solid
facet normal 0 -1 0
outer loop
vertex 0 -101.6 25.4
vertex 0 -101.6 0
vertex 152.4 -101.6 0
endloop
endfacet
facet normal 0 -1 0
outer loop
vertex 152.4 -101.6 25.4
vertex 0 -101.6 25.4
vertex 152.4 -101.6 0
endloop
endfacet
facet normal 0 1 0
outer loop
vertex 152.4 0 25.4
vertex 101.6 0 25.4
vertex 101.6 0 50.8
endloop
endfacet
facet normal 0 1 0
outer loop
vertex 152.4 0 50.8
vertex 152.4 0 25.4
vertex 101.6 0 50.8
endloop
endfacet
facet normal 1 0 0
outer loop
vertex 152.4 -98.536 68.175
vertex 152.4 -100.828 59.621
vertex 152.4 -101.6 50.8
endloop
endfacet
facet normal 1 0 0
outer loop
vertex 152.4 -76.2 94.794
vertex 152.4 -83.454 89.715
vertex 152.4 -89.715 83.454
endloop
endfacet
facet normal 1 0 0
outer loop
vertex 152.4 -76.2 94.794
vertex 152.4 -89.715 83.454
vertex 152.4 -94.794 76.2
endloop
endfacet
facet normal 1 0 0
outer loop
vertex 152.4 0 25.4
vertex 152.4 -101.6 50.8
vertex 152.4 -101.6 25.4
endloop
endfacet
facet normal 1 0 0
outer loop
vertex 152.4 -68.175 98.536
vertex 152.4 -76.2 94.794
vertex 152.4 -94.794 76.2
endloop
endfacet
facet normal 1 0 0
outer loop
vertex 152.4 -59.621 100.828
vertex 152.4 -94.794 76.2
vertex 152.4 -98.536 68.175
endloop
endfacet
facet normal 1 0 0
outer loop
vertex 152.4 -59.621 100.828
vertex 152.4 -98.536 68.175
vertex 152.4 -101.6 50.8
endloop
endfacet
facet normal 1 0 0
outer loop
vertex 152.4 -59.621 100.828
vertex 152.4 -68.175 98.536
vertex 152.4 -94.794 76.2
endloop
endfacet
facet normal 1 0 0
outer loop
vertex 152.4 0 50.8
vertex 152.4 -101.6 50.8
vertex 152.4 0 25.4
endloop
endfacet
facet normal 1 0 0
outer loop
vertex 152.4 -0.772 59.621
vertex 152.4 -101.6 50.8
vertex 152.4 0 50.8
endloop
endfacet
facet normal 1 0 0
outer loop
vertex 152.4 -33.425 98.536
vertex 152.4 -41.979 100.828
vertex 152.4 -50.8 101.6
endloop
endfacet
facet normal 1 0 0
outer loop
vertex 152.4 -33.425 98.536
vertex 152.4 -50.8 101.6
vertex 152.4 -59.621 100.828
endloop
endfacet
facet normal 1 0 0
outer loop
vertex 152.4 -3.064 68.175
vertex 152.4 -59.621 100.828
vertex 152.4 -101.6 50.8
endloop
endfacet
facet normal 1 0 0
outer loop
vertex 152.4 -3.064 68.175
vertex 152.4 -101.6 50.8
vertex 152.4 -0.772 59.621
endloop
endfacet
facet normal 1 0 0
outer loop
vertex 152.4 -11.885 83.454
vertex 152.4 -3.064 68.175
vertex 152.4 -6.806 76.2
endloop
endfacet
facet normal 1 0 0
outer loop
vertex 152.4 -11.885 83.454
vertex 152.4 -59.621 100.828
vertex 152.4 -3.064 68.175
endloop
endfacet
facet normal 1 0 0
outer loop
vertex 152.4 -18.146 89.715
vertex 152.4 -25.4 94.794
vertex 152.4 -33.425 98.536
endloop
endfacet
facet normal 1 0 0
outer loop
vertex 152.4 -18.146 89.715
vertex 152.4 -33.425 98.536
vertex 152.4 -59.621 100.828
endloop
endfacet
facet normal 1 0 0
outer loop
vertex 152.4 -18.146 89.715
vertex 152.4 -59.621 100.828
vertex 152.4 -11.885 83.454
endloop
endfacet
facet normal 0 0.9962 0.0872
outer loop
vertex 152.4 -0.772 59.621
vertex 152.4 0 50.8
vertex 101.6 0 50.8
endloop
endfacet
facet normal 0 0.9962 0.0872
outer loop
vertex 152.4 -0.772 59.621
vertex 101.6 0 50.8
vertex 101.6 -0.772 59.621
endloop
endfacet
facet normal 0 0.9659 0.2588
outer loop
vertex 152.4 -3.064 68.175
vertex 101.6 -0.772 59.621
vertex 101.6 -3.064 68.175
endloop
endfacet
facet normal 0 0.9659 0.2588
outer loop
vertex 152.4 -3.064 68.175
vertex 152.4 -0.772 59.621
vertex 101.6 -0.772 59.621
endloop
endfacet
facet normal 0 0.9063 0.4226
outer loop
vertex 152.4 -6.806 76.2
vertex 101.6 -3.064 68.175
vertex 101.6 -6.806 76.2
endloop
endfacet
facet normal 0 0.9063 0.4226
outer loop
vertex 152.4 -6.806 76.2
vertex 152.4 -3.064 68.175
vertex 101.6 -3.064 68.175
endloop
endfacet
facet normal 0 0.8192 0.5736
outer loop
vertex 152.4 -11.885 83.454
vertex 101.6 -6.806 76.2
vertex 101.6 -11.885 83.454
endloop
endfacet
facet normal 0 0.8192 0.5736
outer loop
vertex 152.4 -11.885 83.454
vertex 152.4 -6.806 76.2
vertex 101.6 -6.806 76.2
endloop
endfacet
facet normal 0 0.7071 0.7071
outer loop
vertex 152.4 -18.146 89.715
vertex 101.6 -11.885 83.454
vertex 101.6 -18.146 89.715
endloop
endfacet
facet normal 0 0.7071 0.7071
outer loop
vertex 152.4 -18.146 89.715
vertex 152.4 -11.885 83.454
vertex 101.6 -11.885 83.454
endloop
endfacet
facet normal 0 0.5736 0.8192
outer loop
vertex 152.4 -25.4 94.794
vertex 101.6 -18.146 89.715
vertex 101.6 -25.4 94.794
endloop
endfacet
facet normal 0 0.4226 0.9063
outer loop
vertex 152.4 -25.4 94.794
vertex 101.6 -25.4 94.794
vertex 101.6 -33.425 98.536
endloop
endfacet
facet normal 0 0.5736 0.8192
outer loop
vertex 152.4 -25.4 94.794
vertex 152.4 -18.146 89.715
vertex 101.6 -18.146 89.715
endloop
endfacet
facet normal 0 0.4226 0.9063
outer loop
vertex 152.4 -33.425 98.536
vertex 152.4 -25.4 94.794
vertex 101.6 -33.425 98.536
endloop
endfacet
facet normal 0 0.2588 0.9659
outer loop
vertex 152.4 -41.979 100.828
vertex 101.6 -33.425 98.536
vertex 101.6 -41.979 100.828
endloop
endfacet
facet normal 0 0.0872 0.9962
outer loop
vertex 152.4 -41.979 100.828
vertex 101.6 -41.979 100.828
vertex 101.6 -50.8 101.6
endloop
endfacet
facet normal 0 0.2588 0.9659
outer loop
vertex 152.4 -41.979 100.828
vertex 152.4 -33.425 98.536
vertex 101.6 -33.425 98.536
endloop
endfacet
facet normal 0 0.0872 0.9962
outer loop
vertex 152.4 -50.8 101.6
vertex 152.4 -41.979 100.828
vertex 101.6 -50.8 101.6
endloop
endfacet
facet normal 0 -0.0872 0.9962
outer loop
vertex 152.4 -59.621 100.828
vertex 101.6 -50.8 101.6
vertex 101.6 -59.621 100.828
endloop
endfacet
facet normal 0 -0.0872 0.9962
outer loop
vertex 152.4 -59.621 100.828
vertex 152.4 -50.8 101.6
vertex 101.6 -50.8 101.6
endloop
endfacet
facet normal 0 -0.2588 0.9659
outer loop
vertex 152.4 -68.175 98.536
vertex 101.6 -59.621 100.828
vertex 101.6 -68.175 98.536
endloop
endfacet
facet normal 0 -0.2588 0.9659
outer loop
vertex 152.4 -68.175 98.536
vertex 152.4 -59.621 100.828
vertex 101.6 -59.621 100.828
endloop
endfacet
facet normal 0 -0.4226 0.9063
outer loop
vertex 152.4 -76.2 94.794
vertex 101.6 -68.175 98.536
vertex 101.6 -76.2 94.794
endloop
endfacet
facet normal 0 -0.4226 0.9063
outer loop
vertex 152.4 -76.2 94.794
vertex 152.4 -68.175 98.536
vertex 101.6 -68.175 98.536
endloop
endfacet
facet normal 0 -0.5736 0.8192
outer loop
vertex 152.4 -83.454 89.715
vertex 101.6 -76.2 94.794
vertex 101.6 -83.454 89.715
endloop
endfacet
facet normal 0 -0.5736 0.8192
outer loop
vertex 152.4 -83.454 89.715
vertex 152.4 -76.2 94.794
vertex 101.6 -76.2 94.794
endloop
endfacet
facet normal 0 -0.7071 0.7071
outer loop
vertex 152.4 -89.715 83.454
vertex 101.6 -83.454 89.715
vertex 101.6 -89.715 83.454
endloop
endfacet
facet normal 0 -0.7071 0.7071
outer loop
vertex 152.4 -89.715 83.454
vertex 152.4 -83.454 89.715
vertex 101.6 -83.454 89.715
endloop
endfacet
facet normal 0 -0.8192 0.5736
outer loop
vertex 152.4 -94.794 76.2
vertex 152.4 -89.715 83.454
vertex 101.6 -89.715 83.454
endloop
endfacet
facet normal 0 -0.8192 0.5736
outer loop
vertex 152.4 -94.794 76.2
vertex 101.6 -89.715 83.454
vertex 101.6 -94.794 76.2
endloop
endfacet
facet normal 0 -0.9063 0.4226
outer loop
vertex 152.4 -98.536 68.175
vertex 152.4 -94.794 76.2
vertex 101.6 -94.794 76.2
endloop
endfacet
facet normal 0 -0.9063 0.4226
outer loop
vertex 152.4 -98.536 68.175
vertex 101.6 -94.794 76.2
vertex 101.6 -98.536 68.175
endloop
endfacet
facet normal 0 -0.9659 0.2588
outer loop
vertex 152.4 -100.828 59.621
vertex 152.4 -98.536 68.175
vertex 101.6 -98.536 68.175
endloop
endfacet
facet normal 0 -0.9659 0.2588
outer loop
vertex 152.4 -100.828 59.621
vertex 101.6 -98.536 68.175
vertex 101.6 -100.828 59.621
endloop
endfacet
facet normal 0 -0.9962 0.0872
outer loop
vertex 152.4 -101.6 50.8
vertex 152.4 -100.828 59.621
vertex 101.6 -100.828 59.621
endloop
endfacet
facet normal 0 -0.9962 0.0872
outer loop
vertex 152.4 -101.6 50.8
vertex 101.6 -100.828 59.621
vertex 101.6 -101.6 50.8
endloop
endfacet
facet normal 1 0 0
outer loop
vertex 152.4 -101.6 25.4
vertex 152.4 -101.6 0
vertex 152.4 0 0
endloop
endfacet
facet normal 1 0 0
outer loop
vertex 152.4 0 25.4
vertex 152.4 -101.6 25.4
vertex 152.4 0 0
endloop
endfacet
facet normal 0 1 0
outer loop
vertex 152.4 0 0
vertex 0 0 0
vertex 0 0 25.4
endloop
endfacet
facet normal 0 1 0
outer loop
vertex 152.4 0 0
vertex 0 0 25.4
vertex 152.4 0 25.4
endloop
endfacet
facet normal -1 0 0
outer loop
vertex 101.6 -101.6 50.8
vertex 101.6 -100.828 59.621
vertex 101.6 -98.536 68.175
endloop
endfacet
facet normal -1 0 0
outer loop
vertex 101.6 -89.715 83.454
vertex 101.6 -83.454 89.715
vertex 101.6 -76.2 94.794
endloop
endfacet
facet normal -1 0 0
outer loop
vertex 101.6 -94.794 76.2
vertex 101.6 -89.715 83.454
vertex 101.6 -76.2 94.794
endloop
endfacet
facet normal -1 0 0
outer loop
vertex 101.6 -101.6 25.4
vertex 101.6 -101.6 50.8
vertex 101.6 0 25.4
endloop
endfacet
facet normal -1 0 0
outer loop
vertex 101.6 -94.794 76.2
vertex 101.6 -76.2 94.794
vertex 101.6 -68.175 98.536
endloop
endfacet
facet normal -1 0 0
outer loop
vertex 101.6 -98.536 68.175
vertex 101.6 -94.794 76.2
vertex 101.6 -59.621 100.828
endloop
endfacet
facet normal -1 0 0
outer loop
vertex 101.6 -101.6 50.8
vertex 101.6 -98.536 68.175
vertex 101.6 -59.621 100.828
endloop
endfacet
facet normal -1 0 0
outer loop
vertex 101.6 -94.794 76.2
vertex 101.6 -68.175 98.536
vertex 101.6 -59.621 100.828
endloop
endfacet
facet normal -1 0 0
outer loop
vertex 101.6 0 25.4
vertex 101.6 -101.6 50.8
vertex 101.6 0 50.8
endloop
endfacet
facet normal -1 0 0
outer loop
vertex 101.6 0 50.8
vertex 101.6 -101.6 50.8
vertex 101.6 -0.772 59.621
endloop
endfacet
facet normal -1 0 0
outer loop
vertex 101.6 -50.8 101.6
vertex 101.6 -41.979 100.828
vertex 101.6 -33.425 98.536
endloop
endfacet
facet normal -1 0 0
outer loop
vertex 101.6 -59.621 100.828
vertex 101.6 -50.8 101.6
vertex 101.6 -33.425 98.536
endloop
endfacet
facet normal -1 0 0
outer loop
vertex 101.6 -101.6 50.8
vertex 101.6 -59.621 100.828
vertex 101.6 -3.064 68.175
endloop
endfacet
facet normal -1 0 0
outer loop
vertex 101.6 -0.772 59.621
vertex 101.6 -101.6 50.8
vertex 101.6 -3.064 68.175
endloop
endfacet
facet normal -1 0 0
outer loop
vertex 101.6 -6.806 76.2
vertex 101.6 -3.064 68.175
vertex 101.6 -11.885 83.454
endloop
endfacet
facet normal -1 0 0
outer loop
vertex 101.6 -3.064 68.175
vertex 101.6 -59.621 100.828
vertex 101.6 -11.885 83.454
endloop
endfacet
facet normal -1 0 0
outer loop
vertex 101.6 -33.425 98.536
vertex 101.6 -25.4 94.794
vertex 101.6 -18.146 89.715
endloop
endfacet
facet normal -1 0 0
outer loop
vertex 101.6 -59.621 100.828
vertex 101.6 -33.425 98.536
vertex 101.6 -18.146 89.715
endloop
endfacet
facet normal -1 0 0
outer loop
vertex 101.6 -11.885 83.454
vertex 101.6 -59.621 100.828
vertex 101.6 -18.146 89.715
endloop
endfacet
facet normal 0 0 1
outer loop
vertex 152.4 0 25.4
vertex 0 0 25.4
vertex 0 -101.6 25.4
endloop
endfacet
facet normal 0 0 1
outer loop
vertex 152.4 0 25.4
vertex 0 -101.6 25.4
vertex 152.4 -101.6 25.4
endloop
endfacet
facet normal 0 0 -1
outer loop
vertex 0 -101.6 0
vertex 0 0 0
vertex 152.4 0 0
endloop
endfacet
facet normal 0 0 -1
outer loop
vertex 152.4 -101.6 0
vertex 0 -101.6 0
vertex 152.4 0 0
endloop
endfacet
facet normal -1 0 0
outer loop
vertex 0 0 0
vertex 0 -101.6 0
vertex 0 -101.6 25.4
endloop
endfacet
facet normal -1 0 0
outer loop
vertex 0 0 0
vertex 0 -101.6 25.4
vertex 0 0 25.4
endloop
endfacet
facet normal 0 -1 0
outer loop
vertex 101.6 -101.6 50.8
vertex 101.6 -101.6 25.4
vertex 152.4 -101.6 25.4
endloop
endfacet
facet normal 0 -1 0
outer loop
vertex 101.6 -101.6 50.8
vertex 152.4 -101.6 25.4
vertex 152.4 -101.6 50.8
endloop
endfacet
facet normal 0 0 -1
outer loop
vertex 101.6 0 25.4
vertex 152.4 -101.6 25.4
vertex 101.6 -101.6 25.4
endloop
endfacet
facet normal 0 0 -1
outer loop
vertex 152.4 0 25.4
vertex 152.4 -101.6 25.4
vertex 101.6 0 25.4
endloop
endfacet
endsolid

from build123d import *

# Parameters (mm, degrees)
F0_W     = 152.4
F0_H     = 101.6
F1_DEPTH = 25.4
F2_W     = 101.6
F2_H     = 25.4
F3_DEPTH = 50.8


with BuildPart() as f1:
    # F0 (on Top) → F1 (new body)
    with BuildSketch(Plane.XY):
        with Locations((76.2, -50.8)):
            Rectangle(F0_W, F0_H)
    extrude(amount=F1_DEPTH)


with BuildPart() as f3:
    # F2 (on face) → F3 (new body)
    with BuildSketch(Plane.YZ.offset(152.4)):
        with Locations((-50.8, 38.1)):
            Rectangle(F2_W, F2_H)
        with BuildLine():
            ThreePointArc((0, 50.8), (-50.8, 101.6), (-101.6, 50.8))
            Line((-101.6, 50.8), (0, 50.8))
        make_face()
    extrude(amount=-F3_DEPTH)


solid = Compound([f1.part, f3.part])
